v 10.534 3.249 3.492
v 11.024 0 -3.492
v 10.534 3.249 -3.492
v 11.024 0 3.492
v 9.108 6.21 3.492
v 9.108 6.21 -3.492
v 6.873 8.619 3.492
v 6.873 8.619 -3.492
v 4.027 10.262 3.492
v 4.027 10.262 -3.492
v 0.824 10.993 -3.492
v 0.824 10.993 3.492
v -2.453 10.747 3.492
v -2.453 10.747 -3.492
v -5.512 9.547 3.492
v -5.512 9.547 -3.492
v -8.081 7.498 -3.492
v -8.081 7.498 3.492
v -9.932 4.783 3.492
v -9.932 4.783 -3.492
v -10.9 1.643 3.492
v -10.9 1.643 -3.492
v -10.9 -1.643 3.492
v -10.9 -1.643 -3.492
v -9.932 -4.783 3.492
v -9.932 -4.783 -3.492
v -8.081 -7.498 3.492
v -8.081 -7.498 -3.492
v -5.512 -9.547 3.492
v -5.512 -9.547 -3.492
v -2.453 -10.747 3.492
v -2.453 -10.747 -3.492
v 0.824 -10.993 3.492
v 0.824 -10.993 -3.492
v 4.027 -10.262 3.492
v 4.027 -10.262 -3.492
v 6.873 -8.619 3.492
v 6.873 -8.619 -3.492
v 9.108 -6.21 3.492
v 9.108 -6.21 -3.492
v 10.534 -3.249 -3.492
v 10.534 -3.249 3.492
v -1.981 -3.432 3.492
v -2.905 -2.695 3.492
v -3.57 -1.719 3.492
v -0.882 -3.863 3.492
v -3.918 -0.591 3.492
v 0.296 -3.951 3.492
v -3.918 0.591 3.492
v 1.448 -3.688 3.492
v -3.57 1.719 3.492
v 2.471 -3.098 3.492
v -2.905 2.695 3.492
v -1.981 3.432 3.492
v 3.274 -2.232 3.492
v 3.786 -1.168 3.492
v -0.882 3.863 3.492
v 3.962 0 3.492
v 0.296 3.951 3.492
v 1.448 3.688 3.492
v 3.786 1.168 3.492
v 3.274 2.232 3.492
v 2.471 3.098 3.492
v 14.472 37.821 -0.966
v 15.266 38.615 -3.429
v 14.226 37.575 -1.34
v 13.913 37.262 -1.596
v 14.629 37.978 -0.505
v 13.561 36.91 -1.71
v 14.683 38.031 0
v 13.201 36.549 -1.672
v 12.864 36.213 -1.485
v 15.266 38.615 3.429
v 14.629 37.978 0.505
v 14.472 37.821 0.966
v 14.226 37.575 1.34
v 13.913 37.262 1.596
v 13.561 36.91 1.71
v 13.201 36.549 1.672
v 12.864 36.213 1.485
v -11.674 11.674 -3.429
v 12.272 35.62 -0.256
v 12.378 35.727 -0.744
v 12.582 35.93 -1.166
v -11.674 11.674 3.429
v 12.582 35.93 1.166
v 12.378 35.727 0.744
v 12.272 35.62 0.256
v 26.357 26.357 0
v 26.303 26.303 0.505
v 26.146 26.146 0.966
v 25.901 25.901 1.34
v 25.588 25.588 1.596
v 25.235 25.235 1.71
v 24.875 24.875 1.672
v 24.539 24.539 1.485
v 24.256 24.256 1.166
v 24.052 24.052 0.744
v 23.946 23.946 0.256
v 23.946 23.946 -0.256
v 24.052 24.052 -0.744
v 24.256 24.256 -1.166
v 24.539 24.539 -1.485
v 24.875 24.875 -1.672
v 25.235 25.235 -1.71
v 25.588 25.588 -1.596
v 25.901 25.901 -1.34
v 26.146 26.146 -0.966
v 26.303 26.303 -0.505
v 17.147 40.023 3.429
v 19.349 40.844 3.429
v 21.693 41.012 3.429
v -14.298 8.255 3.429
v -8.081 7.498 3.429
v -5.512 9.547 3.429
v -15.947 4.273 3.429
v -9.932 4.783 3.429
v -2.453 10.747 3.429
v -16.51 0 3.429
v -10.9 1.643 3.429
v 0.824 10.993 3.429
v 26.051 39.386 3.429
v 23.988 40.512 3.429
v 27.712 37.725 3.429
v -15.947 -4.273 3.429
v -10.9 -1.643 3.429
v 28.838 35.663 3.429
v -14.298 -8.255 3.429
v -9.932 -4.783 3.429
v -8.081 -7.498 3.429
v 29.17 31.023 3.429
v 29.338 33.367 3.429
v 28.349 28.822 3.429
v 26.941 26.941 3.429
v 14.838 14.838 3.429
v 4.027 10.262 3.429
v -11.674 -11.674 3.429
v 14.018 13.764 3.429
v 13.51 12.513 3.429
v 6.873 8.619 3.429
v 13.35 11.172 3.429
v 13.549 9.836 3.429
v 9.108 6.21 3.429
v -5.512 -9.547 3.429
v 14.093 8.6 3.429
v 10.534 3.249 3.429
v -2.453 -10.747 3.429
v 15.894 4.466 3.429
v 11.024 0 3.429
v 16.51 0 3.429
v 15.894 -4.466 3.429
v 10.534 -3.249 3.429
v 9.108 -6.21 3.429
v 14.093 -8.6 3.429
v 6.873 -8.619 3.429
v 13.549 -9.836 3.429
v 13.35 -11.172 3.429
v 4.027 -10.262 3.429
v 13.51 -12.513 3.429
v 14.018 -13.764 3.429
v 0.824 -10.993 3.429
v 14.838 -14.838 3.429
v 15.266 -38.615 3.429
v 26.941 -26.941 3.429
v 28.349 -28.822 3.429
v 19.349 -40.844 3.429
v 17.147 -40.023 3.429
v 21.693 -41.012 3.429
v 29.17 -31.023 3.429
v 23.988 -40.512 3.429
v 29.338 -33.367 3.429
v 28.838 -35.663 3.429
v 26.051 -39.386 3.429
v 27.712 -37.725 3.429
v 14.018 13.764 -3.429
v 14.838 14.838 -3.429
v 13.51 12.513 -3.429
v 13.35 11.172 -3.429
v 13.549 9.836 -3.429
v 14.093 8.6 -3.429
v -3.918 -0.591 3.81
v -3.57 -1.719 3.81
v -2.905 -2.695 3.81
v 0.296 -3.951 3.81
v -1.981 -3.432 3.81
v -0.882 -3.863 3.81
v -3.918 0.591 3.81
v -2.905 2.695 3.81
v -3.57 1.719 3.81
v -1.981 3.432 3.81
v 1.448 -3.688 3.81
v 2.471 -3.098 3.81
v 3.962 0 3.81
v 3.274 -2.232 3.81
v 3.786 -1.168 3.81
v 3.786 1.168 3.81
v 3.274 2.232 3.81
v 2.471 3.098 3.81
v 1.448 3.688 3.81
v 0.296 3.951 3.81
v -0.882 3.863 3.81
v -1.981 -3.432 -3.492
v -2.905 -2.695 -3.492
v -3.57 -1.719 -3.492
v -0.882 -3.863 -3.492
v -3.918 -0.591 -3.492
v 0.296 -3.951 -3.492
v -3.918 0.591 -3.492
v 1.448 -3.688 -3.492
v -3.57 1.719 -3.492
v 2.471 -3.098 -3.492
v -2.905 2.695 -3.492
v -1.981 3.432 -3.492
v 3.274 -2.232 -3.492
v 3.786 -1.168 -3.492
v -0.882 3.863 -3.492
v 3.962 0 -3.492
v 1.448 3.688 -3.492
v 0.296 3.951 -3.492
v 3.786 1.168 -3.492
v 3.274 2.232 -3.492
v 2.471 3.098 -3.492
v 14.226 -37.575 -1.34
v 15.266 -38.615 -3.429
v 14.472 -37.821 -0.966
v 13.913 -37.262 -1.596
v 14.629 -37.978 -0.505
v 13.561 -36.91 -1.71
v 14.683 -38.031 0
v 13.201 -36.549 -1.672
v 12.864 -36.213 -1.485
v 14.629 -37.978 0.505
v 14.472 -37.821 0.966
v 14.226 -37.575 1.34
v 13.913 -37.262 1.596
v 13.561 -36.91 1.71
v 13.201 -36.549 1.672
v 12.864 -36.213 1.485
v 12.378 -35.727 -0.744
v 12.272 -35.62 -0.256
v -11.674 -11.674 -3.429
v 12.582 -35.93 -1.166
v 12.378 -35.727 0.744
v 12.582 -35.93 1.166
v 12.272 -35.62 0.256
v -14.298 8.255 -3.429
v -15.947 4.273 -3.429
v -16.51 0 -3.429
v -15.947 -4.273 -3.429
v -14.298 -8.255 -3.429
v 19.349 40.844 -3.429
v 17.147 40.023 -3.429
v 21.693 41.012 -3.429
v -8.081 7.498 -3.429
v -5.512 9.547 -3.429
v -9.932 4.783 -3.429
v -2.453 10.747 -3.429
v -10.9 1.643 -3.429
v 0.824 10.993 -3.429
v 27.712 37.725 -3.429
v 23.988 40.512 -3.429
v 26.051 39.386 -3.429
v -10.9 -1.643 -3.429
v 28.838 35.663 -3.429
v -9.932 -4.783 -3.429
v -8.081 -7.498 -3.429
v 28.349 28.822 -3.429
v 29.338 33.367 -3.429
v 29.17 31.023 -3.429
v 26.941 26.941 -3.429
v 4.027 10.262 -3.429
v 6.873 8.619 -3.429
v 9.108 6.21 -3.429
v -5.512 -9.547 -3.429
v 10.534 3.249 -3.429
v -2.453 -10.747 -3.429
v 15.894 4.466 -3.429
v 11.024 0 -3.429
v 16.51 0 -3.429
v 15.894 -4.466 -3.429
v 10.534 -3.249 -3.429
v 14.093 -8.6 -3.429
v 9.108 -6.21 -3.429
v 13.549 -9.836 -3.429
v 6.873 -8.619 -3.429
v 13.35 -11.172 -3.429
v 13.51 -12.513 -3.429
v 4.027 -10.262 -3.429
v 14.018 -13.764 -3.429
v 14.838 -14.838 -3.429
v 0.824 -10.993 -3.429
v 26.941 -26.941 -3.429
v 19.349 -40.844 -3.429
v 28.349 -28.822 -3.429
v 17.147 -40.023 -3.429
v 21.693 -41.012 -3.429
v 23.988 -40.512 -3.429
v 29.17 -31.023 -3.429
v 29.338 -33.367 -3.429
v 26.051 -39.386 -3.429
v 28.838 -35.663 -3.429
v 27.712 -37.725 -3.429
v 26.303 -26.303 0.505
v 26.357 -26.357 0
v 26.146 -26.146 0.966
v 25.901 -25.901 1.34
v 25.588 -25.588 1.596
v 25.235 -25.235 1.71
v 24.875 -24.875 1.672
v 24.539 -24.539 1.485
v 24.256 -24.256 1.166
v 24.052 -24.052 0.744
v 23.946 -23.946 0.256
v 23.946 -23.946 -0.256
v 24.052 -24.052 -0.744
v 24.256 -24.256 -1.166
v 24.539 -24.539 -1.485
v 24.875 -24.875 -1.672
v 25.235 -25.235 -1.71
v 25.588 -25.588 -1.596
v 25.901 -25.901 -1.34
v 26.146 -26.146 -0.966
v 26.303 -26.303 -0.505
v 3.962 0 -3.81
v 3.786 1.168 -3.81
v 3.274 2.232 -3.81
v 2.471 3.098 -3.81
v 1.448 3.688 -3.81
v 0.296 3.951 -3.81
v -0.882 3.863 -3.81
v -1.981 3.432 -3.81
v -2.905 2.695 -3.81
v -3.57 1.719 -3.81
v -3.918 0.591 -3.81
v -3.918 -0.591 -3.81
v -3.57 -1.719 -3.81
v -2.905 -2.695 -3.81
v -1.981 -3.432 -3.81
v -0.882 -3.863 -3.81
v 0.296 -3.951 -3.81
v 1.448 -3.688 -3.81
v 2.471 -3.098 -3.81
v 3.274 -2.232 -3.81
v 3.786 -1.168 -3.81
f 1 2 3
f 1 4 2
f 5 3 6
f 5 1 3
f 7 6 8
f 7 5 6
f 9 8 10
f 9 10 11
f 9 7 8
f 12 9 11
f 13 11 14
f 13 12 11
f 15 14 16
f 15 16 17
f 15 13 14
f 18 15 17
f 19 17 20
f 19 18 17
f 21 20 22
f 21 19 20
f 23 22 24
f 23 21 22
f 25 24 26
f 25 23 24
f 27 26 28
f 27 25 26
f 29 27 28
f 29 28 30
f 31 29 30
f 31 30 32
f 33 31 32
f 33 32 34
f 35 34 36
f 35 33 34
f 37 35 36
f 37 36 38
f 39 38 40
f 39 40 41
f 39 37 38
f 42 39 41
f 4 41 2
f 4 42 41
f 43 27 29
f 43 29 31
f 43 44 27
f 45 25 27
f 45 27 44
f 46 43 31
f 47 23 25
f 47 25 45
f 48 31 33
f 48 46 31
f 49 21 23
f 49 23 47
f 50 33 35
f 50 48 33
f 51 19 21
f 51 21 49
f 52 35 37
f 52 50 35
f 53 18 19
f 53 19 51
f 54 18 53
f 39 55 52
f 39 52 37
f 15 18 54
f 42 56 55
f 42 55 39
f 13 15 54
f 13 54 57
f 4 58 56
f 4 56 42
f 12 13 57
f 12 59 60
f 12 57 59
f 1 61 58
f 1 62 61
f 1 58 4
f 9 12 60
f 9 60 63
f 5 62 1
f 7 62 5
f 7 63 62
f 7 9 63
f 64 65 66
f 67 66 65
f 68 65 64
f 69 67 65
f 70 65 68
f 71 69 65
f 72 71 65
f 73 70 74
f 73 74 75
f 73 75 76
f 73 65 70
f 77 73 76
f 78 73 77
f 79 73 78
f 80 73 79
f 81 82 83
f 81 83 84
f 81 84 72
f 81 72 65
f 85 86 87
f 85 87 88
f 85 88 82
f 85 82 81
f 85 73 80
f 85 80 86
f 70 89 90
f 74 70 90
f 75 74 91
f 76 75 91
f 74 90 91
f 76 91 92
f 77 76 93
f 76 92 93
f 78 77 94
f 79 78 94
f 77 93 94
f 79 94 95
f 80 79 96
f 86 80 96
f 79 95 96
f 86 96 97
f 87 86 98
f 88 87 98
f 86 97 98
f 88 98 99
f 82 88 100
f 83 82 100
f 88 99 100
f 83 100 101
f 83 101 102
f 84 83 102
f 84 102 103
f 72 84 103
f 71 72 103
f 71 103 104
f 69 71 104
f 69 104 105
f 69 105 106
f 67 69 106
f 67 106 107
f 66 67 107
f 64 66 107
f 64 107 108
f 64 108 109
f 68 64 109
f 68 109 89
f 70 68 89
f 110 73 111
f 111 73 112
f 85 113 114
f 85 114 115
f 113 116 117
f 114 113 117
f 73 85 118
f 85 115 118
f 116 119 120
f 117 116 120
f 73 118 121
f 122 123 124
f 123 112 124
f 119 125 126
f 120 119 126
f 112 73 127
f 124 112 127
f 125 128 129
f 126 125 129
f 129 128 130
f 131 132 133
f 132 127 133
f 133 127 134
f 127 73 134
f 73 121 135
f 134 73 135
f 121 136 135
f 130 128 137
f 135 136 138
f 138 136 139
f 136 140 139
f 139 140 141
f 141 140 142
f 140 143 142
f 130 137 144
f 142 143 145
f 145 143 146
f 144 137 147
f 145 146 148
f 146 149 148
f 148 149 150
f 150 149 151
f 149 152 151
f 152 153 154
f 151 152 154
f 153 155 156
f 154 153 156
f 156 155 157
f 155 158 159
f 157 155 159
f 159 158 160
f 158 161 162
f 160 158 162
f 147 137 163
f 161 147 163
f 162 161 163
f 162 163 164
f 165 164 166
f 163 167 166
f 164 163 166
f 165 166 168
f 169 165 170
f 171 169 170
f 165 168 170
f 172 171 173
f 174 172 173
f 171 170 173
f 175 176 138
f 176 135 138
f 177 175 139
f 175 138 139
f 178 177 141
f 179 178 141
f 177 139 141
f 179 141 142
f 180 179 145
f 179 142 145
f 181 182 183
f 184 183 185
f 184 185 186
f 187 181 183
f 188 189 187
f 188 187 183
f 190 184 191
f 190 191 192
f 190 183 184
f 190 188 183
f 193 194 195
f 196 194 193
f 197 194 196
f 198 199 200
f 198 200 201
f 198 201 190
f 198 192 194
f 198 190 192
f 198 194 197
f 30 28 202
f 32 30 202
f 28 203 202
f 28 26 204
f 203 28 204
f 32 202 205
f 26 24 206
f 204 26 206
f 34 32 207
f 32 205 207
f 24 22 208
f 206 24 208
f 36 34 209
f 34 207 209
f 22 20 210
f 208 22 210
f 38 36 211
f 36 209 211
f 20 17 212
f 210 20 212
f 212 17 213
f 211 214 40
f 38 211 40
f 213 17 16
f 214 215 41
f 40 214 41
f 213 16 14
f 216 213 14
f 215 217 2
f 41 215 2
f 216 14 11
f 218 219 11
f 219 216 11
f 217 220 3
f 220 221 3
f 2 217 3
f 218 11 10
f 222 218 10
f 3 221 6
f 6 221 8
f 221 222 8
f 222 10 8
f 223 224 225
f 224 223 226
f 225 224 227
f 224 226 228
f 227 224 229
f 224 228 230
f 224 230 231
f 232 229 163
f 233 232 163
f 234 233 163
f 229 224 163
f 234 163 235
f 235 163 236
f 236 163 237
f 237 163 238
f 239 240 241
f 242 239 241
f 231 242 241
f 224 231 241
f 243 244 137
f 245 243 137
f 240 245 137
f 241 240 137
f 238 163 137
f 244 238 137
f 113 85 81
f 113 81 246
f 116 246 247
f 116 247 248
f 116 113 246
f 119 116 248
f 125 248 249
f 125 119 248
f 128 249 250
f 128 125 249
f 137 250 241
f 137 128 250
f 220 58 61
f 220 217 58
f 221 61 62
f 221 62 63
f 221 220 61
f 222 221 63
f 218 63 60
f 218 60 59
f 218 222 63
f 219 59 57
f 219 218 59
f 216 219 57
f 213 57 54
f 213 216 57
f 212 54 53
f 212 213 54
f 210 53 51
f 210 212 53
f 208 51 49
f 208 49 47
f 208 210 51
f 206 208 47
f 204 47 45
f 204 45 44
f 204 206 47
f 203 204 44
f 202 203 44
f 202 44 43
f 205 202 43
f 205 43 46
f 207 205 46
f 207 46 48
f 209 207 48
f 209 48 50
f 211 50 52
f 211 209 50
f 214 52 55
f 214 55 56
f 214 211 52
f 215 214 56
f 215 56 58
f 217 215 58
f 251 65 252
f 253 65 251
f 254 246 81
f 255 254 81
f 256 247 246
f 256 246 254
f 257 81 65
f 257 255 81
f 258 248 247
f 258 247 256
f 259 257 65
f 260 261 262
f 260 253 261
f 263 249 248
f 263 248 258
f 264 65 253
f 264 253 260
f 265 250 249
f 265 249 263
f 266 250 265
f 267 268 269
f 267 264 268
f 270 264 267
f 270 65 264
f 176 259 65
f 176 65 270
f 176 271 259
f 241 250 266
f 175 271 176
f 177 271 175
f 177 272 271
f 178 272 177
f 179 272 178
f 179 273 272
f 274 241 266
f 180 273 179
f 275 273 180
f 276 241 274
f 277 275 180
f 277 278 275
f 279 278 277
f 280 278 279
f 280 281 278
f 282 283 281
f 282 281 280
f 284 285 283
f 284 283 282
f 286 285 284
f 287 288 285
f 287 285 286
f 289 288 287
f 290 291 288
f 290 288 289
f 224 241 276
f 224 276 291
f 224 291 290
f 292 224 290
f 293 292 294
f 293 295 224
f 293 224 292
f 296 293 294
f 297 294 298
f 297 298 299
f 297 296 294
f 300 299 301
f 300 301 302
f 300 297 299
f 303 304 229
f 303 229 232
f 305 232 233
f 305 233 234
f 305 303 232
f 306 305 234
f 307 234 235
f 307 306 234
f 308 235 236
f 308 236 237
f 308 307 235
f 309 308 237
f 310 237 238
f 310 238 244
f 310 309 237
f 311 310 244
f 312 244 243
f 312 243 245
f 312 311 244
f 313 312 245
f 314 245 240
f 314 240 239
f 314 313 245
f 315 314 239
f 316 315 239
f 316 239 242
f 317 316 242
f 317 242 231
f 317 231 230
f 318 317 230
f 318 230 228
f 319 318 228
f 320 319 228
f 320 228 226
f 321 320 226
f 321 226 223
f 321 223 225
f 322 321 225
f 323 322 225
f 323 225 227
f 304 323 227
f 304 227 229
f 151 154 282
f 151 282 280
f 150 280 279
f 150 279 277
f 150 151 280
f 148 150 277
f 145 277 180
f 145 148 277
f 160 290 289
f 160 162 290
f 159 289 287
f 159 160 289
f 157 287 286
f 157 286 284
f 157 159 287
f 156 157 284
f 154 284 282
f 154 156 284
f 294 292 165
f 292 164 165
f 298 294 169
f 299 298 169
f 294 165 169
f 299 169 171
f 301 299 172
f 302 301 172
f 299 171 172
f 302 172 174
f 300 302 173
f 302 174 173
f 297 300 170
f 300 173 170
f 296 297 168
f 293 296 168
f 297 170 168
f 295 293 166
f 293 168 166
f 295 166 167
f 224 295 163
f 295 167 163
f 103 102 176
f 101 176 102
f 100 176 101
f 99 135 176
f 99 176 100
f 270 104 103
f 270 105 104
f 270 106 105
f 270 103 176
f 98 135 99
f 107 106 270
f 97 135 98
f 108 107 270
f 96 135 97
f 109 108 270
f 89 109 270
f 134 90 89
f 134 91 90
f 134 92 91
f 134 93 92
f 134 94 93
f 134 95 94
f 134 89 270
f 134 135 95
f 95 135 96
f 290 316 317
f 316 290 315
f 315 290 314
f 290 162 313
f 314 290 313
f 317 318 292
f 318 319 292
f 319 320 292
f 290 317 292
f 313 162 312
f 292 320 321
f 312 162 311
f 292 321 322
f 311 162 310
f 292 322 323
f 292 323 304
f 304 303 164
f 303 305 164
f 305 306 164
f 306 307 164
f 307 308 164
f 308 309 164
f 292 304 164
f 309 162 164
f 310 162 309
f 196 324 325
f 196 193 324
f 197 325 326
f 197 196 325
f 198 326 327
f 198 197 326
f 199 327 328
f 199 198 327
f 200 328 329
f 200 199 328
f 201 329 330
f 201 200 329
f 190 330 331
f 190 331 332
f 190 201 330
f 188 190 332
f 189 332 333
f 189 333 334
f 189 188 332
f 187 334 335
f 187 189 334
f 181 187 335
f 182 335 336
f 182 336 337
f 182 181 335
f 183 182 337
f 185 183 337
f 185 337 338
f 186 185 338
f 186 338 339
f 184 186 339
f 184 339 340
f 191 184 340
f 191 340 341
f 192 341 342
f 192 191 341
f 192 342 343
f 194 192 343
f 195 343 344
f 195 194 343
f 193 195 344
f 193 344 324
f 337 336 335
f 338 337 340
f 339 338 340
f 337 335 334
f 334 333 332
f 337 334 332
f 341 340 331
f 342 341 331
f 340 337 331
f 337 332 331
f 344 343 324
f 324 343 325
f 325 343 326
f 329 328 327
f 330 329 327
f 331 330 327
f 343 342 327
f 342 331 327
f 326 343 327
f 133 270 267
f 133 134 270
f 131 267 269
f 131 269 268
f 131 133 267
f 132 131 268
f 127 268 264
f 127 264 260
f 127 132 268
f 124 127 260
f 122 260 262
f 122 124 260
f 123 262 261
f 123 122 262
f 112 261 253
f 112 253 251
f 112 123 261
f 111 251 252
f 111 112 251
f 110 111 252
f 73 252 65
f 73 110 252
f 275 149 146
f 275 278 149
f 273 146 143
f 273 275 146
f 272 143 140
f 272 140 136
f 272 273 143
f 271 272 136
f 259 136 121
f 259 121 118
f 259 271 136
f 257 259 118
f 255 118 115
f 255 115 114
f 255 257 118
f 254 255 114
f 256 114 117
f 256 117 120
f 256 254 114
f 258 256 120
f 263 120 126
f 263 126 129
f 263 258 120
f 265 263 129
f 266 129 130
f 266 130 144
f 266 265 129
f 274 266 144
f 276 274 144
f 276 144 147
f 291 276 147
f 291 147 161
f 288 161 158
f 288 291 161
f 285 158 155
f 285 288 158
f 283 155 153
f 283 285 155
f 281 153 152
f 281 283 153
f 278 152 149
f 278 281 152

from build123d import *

# Parameters (mm, degrees)
F0_R     = 11.0236
F0_R_2   = 3.9624
F1_DEPTH = 3.4925
F2_R     = 11.0236
F3_DEPTH = 3.429
F4_R     = 5.08
F5_R     = 1.7145
F6_DEPTH = 40.6899994361
F8_R     = 3.9624
F9_DEPTH = 3.81


with BuildPart() as f1:
    # F0 (on Top) → F1 (new body, symmetric)
    with BuildSketch(Plane.XY):
        Circle(F0_R)
        Circle(F0_R_2, mode=Mode.SUBTRACT)
    extrude(amount=F1_DEPTH, both=True)


with BuildPart() as f3:
    # F2 (on Top) → F3 (new body, symmetric)
    with BuildSketch(Plane.XY):
        with BuildLine():
            Line((15.2664354058, 38.6151013206), (-11.6743329574, 11.6743329574))
            ThreePointArc((-11.6743329574, 11.6743329574), (0, -16.51), (11.6743329574, 11.6743329574))
            Line((11.6743329574, 11.6743329574), (26.9407683632, 26.9407683632))
            ThreePointArc((26.9407683632, 26.9407683632), (26.9407683632, 38.6151013206), (15.2664354058, 38.6151013206))
        make_face()
        Circle(F2_R, mode=Mode.SUBTRACT)
    extrude(amount=F3_DEPTH, both=True)

    # F4
    f4_edges = [f3.edges().sort_by_distance(p)[0] for p in [
        (11.674333, 11.674333, 0),
    ]]
    fillet(f4_edges, radius=F4_R)

    # F5 (on face) → F6 (cut, through all)
    with BuildSketch(Plane(origin=(0, 0, 0), x_dir=(0.7071067812, 0.7071067812, 0), z_dir=(0.7071067812, -0.7071067812, 0))):
        with Locations((35.56, 0)):
            Circle(F5_R)
    extrude(amount=-F6_DEPTH, mode=Mode.SUBTRACT)

    # F7: F3 across plane


with BuildPart() as f3_1:
    add(f3.part)
    add(f3.part.mirror(Plane.XZ))


with BuildPart() as f9:
    # F8 (on Top) → F9 (new body, symmetric)
    with BuildSketch(Plane.XY):
        Circle(F8_R)
    extrude(amount=F9_DEPTH, both=True)


solid = Compound([f1.part, f3_1.part, f9.part])
